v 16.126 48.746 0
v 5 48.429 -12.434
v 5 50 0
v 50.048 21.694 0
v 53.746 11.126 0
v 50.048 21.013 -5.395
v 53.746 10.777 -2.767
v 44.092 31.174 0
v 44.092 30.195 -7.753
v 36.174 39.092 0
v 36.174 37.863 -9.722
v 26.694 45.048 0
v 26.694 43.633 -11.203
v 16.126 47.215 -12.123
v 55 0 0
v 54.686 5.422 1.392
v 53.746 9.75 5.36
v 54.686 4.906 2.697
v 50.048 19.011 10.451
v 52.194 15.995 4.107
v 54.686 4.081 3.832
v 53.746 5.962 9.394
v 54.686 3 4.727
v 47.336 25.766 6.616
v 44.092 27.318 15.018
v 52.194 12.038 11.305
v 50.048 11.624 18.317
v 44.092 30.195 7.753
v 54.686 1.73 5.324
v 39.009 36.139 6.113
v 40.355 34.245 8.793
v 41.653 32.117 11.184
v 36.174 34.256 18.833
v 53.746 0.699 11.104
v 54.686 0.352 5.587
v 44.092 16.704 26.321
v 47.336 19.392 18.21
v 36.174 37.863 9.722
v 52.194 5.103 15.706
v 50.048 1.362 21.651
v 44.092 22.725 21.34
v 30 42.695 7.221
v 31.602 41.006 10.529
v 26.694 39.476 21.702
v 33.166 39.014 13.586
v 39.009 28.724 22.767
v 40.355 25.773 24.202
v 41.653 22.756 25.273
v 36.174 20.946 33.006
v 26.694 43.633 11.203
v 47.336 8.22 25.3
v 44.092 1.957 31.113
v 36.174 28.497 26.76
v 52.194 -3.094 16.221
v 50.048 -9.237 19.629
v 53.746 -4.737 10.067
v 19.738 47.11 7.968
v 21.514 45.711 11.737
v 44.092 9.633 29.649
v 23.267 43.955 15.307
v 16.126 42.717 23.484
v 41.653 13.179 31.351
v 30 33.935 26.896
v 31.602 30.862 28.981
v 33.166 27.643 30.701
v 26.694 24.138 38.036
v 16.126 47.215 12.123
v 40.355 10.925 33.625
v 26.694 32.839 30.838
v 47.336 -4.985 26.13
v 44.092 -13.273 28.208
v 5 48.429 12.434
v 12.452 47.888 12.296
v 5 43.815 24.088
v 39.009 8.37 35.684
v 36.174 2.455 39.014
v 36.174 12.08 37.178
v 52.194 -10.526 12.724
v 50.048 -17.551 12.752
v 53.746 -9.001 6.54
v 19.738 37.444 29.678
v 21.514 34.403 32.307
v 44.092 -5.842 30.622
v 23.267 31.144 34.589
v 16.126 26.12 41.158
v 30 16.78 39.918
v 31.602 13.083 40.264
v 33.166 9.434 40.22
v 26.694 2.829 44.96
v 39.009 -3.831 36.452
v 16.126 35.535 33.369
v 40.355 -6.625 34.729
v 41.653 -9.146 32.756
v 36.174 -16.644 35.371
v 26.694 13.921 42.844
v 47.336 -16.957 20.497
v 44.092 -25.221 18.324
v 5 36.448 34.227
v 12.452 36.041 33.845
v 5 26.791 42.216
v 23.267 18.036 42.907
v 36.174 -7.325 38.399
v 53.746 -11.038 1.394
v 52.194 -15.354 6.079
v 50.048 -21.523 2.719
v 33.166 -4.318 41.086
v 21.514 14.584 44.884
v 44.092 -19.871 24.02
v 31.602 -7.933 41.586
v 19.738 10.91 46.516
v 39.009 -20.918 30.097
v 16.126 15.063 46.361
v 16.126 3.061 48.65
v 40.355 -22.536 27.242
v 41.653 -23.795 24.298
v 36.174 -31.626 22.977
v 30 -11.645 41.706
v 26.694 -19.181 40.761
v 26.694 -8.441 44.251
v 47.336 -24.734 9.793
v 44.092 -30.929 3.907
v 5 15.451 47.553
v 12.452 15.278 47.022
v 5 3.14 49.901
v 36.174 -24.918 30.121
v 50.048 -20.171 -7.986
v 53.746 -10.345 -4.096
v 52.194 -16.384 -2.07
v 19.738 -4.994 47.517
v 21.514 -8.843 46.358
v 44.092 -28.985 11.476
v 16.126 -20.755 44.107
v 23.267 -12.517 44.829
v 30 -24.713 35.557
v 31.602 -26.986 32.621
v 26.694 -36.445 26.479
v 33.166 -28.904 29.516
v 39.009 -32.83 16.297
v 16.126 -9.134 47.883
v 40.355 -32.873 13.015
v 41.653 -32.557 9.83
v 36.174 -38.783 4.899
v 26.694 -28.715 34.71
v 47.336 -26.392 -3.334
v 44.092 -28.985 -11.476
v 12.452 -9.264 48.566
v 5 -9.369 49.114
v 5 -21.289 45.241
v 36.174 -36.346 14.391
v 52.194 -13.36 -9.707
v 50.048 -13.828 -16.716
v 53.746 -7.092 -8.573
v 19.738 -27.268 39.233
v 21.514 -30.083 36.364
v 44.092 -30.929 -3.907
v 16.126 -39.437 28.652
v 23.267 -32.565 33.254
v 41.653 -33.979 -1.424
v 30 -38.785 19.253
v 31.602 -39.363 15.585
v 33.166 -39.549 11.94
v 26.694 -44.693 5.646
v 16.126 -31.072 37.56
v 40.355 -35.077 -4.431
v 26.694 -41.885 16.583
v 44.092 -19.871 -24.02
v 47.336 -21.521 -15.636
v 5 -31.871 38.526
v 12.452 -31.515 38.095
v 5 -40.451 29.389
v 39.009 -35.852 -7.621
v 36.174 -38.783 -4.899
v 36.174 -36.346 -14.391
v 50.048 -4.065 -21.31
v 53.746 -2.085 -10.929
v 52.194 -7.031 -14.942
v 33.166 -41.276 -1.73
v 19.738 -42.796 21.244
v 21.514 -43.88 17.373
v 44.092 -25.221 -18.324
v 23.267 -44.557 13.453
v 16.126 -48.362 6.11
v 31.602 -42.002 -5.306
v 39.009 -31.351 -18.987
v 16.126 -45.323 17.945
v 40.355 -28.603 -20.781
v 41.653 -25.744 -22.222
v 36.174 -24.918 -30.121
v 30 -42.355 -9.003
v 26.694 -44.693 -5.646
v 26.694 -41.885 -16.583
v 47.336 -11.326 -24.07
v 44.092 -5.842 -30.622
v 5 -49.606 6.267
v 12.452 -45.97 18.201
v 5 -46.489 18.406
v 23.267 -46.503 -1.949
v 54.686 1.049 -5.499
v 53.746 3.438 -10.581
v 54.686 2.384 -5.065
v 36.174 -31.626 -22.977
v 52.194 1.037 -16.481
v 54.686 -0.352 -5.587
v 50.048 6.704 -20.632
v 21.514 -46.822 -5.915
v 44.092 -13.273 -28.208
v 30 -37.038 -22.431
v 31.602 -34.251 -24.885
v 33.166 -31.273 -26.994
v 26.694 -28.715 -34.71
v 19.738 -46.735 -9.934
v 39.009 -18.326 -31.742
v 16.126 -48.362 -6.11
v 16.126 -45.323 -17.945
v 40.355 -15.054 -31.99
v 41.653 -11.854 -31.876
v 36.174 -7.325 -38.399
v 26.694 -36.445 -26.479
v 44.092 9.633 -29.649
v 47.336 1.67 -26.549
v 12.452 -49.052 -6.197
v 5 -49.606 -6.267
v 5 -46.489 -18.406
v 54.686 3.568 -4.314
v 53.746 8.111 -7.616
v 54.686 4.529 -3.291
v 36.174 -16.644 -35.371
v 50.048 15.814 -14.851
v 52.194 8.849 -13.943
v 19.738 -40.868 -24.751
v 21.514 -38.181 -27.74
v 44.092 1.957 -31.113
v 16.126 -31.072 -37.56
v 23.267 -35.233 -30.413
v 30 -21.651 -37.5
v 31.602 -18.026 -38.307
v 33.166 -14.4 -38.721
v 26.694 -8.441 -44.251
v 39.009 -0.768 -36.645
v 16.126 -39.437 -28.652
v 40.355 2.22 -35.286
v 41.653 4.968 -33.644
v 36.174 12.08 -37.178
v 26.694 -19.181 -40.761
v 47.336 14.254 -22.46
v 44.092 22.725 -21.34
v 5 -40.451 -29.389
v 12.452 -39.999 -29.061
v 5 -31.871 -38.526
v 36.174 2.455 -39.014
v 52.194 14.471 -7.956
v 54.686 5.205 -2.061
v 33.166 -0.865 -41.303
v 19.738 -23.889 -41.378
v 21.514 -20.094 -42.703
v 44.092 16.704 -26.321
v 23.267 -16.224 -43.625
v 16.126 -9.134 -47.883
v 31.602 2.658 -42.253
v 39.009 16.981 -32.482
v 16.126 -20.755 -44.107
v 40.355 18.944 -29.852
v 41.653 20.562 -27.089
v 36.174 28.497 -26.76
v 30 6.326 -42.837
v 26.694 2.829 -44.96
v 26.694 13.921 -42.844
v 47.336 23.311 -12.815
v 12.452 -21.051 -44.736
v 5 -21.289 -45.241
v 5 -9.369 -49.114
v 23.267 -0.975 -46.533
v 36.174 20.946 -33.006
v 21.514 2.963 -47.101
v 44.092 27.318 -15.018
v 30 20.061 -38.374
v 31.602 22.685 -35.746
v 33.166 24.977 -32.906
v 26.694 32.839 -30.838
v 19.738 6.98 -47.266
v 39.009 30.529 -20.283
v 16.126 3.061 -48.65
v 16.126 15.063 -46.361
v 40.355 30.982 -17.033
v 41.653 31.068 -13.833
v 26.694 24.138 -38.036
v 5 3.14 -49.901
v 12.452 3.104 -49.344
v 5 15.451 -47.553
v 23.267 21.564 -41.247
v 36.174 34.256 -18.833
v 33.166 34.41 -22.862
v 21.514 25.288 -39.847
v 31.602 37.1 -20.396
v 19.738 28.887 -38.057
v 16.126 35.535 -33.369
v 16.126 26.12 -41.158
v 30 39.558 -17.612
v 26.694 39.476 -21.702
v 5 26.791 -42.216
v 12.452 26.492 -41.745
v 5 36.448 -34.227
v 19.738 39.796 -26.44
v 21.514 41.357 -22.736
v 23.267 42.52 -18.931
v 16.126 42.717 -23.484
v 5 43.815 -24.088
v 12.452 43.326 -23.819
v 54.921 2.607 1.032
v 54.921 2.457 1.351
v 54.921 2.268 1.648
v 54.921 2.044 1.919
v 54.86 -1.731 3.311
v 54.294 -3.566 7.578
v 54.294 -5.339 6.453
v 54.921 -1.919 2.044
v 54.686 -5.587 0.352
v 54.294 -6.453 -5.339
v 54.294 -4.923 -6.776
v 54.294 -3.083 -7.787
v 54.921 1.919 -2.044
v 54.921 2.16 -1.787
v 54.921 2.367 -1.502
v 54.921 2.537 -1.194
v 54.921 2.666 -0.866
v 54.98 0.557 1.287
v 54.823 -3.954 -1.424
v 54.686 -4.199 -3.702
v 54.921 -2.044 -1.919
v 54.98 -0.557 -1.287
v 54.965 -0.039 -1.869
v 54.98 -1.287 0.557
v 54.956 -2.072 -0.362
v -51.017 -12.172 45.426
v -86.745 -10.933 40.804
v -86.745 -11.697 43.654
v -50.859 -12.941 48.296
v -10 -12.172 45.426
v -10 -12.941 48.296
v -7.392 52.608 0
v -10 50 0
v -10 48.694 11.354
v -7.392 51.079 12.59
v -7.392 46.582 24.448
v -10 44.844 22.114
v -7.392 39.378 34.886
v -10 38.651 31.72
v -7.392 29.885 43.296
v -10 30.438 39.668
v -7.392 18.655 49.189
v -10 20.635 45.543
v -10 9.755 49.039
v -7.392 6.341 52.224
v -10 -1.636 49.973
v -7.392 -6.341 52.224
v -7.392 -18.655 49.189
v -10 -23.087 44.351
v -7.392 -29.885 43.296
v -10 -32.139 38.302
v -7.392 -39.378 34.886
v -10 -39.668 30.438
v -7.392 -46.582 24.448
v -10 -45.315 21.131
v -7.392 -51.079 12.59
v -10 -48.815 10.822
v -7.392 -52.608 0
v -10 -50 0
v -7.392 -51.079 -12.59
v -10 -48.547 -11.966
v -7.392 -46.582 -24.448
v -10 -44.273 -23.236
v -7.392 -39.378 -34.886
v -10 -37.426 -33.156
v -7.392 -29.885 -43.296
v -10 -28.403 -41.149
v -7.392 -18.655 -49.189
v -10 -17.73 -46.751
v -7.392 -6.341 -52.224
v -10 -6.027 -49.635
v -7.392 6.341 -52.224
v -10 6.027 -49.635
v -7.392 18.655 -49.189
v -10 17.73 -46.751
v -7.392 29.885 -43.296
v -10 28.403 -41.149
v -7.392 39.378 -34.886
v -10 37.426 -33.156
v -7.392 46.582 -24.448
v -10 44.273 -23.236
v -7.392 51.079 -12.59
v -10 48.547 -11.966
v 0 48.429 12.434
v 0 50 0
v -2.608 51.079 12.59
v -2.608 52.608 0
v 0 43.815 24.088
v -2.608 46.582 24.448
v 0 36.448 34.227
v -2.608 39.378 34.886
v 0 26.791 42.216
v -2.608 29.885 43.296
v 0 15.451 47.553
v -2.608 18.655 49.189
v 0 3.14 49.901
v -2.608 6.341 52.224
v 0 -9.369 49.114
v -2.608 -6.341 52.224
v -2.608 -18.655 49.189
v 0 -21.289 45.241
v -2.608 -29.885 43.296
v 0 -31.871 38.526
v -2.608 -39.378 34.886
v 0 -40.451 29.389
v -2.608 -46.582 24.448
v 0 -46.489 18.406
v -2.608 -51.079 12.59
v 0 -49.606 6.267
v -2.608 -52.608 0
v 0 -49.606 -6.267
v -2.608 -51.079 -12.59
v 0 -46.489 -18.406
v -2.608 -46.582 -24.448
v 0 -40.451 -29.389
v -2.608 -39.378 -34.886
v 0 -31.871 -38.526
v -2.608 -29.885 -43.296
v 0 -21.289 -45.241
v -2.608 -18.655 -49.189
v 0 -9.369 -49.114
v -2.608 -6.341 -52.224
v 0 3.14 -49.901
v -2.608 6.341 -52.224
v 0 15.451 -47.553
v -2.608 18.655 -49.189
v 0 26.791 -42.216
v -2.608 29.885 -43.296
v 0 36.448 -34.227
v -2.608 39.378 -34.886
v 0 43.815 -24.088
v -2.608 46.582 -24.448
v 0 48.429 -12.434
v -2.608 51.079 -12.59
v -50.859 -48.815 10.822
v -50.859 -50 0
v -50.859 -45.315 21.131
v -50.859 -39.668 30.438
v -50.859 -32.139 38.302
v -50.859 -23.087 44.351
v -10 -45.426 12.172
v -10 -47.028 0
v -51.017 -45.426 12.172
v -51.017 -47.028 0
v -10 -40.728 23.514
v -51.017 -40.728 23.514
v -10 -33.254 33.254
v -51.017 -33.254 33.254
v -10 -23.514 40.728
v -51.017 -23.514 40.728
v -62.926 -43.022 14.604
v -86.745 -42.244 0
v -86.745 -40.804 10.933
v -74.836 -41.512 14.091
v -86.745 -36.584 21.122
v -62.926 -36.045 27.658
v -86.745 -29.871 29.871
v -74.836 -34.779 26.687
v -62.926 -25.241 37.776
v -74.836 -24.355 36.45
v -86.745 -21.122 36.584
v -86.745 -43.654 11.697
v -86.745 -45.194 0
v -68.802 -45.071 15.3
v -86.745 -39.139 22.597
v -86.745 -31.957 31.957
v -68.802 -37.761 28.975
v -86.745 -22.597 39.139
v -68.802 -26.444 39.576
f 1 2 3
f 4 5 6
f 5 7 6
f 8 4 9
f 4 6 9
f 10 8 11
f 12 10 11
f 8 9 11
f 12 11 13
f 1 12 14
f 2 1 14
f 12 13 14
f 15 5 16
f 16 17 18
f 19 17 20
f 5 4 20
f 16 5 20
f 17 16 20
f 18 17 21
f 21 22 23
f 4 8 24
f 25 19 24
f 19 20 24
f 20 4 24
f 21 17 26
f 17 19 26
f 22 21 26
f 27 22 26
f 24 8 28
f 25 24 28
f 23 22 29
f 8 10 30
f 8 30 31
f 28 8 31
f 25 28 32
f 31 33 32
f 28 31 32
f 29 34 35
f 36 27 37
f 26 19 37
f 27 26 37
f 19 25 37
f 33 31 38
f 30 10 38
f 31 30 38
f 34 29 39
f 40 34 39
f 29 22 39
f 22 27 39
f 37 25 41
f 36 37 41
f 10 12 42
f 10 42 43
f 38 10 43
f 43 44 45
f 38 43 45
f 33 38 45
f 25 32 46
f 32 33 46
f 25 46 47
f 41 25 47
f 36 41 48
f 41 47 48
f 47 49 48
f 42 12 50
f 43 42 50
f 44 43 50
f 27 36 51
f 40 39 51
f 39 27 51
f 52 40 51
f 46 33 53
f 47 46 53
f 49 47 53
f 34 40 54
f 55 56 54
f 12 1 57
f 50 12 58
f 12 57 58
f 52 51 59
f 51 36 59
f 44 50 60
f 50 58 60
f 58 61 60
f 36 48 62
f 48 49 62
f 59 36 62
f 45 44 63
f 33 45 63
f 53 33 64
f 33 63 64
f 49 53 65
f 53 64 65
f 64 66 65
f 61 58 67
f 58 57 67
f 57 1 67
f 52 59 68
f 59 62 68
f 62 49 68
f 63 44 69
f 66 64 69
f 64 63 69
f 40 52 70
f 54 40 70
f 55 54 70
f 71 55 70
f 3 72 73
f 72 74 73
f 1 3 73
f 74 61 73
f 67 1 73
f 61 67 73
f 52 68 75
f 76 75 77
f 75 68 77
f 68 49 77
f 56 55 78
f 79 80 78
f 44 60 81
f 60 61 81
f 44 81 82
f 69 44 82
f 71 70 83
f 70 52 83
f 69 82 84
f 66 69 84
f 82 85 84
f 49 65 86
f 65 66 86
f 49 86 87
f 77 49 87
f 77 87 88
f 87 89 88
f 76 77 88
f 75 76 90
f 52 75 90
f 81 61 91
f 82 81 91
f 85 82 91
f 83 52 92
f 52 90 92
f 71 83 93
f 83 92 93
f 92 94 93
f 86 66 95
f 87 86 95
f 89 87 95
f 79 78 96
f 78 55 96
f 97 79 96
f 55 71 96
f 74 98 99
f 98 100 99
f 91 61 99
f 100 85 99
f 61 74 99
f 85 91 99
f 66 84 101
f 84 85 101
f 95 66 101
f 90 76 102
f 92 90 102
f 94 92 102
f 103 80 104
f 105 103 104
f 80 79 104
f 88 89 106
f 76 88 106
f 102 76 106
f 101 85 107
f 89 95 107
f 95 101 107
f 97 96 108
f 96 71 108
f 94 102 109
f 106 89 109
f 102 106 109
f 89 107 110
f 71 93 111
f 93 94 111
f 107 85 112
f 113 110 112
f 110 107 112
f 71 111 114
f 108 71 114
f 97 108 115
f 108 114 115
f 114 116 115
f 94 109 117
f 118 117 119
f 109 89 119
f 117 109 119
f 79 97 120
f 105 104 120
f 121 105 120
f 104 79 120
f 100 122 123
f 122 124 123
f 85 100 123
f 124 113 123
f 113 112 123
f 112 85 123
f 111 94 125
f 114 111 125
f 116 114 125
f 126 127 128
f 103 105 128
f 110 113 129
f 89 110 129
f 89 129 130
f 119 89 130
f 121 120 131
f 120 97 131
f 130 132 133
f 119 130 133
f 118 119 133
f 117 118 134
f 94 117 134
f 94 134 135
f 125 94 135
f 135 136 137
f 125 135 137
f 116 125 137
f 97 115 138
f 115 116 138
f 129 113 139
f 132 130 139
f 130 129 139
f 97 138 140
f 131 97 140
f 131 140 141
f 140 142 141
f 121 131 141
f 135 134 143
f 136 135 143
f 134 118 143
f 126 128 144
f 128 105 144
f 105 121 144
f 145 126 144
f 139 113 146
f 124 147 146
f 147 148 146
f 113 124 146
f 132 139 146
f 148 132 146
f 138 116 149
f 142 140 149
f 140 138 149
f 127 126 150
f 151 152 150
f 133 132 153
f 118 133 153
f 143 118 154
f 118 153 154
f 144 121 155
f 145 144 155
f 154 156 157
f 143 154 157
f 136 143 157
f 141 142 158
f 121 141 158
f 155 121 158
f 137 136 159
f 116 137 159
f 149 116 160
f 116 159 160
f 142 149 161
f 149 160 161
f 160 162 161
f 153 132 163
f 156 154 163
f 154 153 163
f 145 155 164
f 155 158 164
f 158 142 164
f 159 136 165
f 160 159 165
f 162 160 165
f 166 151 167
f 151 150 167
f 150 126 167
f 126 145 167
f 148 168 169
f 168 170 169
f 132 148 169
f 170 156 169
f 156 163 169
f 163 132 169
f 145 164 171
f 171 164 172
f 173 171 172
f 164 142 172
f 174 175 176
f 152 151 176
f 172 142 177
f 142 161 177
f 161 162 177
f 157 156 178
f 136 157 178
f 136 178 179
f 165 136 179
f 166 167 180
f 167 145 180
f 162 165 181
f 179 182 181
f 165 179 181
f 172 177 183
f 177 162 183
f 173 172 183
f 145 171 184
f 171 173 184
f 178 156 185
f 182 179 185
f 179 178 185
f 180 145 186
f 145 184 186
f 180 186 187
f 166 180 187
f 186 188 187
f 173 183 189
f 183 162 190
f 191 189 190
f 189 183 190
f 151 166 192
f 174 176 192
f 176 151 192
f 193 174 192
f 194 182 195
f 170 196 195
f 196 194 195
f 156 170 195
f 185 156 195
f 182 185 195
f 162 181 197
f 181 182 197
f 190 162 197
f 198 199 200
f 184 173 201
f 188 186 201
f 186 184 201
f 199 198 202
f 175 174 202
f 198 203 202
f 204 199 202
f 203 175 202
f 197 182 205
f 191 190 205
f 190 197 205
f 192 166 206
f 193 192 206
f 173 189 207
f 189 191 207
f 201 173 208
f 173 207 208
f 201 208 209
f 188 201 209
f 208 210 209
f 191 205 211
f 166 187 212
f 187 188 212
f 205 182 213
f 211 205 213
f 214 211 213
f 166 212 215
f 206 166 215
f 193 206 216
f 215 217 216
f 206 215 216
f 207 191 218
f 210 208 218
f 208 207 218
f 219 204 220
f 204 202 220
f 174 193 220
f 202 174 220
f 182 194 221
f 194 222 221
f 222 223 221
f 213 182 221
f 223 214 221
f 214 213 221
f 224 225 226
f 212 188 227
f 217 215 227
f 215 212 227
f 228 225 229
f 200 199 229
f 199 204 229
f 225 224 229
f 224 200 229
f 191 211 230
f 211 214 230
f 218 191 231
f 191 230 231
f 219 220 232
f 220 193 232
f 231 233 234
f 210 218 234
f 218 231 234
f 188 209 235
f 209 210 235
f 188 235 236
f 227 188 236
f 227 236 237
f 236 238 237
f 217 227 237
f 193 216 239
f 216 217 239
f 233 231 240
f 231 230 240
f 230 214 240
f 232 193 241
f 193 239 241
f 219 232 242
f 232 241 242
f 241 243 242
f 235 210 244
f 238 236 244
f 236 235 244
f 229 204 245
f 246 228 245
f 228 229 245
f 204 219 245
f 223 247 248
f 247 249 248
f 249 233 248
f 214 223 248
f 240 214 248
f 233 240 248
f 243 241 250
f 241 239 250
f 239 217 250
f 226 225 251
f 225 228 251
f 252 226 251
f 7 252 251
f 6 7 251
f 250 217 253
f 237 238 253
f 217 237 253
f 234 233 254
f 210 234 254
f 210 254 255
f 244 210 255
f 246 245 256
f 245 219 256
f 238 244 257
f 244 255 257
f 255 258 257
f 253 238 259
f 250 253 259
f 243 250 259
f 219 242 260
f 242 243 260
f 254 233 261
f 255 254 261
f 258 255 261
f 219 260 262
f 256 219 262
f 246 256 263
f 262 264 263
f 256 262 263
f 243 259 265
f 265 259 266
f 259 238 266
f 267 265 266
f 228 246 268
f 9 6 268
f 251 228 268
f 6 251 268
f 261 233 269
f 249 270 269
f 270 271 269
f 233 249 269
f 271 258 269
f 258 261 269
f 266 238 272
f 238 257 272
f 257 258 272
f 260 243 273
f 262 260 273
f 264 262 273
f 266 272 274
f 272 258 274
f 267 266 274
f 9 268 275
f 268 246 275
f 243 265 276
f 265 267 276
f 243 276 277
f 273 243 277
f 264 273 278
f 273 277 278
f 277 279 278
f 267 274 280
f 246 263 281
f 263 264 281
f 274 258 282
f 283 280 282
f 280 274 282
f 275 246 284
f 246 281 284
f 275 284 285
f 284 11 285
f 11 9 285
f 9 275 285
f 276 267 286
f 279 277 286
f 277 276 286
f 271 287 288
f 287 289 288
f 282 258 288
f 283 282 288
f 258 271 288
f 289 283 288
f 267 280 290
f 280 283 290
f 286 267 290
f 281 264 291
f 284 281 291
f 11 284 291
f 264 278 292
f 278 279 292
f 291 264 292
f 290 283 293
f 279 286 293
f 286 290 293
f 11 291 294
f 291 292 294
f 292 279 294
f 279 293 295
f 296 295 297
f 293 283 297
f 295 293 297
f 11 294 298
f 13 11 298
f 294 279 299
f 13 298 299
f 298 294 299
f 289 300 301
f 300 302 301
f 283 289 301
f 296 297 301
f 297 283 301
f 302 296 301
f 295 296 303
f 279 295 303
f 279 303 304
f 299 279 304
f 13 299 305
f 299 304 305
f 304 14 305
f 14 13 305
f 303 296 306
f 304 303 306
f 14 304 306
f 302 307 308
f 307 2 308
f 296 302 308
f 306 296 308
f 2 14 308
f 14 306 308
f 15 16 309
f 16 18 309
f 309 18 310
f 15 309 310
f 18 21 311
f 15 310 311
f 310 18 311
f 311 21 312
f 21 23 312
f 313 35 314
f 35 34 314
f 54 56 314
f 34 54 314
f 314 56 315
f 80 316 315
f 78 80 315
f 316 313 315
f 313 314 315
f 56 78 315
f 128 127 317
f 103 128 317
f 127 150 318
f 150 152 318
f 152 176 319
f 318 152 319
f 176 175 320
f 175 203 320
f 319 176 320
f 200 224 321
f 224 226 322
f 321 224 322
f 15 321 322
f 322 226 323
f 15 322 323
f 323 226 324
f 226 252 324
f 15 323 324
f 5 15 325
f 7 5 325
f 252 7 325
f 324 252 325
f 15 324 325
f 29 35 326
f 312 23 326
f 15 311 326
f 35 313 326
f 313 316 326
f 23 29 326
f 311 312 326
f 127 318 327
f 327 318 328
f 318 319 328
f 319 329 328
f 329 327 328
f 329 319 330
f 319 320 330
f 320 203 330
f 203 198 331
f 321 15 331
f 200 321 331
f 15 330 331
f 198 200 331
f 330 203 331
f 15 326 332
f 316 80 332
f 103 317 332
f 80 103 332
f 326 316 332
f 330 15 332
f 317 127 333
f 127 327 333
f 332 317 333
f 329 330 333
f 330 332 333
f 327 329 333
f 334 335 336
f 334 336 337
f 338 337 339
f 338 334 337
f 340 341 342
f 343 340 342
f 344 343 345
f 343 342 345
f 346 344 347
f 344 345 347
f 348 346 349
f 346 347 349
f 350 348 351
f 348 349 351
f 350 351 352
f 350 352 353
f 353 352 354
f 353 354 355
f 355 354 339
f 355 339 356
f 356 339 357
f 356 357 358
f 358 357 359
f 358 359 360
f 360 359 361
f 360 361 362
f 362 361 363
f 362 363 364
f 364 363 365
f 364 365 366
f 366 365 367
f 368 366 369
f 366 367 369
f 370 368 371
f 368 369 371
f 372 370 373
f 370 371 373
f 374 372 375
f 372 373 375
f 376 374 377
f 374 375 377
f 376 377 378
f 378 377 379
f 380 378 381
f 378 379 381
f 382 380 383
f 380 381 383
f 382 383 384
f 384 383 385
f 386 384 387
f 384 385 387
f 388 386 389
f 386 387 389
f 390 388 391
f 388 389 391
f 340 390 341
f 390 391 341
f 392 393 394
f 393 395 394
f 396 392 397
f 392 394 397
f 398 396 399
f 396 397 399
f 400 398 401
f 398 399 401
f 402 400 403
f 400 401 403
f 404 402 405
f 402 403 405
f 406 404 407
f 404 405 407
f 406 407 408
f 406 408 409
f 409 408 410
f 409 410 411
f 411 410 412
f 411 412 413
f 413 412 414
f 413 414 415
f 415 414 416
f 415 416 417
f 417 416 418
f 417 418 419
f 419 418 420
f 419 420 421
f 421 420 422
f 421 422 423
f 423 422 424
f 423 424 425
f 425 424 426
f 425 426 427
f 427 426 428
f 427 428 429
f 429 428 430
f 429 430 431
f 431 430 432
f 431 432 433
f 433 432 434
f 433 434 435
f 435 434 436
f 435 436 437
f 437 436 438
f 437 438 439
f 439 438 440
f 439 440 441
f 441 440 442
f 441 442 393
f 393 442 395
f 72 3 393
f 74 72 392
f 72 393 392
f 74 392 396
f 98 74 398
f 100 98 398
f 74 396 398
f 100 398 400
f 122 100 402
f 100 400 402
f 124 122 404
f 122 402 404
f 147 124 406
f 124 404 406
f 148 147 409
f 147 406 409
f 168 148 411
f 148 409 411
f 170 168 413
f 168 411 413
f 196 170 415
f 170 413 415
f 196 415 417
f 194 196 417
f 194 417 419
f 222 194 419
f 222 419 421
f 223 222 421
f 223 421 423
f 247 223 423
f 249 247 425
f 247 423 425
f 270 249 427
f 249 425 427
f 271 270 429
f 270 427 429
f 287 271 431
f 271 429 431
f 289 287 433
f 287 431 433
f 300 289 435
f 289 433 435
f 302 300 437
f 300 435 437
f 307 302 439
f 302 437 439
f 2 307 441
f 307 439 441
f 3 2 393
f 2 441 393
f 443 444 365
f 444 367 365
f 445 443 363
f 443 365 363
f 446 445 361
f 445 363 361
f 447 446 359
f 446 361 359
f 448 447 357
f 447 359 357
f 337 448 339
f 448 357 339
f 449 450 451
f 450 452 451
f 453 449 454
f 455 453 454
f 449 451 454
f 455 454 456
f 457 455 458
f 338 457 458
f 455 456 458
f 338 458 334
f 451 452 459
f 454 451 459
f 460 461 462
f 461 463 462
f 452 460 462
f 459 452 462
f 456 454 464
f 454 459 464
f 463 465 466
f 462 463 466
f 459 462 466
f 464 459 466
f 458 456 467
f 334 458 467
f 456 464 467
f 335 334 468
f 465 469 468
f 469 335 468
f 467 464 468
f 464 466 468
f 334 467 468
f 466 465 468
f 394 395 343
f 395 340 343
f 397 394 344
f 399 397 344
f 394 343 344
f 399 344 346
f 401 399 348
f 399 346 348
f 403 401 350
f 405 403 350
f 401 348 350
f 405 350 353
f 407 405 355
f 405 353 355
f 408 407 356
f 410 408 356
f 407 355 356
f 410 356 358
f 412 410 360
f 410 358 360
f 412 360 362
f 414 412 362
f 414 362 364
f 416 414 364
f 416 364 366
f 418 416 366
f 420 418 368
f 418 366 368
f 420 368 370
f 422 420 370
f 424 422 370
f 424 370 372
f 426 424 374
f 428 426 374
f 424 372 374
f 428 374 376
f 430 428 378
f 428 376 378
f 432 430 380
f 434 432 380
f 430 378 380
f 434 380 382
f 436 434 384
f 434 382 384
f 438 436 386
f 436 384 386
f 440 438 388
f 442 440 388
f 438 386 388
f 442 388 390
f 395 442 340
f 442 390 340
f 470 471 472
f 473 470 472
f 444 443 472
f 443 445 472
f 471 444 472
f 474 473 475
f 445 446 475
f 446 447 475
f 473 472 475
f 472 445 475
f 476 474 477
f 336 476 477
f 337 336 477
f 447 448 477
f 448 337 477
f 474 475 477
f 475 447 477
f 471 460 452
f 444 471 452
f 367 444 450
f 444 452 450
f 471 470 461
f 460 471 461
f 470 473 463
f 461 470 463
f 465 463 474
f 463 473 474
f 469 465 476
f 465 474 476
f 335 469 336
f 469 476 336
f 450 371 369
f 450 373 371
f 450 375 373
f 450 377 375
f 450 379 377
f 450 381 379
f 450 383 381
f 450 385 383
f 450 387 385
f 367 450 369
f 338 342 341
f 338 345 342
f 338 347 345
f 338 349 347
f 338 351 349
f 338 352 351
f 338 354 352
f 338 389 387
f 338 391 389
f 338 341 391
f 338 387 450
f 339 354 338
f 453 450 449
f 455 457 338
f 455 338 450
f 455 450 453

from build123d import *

# Parameters (mm, degrees)
F0_W     = 10
F0_H     = 50
F2_ANGLE = -75


with BuildPart() as f1:
    # F0 (on Top) → F1 (revolve)
    with BuildSketch(Plane.XY):
        with Locations((-5, 25)):
            Rectangle(F0_W, F0_H)
        with BuildLine():
            Line((0, 50), (0, 0))
            Line((0, 0), (55, 0))
            ThreePointArc((55, 0), (40.355339, 35.355339), (5, 50))
            Line((5, 50), (0, 50))
        make_face()
        Polygon((-10, 50), (0, 50), (-2.608035, 52.608035), (-7.391965, 52.608035), align=None)
    revolve(axis=Axis((27.5, 0, 0), (1, 0, 0)))

    # F0 (on Top) → F2 (revolve)
    with BuildSketch(Plane.XY):
        Polygon((-50.859153, -50), (-10, -50), (-10, -47.028106), (-51.016824, -47.028106), (-86.745456, -42.243611), (-86.745456, -45.194391), align=None)
    revolve(axis=Axis((27.5, 0, 0), (1, 0, 0)), revolution_arc=F2_ANGLE)


solid = f1.part
